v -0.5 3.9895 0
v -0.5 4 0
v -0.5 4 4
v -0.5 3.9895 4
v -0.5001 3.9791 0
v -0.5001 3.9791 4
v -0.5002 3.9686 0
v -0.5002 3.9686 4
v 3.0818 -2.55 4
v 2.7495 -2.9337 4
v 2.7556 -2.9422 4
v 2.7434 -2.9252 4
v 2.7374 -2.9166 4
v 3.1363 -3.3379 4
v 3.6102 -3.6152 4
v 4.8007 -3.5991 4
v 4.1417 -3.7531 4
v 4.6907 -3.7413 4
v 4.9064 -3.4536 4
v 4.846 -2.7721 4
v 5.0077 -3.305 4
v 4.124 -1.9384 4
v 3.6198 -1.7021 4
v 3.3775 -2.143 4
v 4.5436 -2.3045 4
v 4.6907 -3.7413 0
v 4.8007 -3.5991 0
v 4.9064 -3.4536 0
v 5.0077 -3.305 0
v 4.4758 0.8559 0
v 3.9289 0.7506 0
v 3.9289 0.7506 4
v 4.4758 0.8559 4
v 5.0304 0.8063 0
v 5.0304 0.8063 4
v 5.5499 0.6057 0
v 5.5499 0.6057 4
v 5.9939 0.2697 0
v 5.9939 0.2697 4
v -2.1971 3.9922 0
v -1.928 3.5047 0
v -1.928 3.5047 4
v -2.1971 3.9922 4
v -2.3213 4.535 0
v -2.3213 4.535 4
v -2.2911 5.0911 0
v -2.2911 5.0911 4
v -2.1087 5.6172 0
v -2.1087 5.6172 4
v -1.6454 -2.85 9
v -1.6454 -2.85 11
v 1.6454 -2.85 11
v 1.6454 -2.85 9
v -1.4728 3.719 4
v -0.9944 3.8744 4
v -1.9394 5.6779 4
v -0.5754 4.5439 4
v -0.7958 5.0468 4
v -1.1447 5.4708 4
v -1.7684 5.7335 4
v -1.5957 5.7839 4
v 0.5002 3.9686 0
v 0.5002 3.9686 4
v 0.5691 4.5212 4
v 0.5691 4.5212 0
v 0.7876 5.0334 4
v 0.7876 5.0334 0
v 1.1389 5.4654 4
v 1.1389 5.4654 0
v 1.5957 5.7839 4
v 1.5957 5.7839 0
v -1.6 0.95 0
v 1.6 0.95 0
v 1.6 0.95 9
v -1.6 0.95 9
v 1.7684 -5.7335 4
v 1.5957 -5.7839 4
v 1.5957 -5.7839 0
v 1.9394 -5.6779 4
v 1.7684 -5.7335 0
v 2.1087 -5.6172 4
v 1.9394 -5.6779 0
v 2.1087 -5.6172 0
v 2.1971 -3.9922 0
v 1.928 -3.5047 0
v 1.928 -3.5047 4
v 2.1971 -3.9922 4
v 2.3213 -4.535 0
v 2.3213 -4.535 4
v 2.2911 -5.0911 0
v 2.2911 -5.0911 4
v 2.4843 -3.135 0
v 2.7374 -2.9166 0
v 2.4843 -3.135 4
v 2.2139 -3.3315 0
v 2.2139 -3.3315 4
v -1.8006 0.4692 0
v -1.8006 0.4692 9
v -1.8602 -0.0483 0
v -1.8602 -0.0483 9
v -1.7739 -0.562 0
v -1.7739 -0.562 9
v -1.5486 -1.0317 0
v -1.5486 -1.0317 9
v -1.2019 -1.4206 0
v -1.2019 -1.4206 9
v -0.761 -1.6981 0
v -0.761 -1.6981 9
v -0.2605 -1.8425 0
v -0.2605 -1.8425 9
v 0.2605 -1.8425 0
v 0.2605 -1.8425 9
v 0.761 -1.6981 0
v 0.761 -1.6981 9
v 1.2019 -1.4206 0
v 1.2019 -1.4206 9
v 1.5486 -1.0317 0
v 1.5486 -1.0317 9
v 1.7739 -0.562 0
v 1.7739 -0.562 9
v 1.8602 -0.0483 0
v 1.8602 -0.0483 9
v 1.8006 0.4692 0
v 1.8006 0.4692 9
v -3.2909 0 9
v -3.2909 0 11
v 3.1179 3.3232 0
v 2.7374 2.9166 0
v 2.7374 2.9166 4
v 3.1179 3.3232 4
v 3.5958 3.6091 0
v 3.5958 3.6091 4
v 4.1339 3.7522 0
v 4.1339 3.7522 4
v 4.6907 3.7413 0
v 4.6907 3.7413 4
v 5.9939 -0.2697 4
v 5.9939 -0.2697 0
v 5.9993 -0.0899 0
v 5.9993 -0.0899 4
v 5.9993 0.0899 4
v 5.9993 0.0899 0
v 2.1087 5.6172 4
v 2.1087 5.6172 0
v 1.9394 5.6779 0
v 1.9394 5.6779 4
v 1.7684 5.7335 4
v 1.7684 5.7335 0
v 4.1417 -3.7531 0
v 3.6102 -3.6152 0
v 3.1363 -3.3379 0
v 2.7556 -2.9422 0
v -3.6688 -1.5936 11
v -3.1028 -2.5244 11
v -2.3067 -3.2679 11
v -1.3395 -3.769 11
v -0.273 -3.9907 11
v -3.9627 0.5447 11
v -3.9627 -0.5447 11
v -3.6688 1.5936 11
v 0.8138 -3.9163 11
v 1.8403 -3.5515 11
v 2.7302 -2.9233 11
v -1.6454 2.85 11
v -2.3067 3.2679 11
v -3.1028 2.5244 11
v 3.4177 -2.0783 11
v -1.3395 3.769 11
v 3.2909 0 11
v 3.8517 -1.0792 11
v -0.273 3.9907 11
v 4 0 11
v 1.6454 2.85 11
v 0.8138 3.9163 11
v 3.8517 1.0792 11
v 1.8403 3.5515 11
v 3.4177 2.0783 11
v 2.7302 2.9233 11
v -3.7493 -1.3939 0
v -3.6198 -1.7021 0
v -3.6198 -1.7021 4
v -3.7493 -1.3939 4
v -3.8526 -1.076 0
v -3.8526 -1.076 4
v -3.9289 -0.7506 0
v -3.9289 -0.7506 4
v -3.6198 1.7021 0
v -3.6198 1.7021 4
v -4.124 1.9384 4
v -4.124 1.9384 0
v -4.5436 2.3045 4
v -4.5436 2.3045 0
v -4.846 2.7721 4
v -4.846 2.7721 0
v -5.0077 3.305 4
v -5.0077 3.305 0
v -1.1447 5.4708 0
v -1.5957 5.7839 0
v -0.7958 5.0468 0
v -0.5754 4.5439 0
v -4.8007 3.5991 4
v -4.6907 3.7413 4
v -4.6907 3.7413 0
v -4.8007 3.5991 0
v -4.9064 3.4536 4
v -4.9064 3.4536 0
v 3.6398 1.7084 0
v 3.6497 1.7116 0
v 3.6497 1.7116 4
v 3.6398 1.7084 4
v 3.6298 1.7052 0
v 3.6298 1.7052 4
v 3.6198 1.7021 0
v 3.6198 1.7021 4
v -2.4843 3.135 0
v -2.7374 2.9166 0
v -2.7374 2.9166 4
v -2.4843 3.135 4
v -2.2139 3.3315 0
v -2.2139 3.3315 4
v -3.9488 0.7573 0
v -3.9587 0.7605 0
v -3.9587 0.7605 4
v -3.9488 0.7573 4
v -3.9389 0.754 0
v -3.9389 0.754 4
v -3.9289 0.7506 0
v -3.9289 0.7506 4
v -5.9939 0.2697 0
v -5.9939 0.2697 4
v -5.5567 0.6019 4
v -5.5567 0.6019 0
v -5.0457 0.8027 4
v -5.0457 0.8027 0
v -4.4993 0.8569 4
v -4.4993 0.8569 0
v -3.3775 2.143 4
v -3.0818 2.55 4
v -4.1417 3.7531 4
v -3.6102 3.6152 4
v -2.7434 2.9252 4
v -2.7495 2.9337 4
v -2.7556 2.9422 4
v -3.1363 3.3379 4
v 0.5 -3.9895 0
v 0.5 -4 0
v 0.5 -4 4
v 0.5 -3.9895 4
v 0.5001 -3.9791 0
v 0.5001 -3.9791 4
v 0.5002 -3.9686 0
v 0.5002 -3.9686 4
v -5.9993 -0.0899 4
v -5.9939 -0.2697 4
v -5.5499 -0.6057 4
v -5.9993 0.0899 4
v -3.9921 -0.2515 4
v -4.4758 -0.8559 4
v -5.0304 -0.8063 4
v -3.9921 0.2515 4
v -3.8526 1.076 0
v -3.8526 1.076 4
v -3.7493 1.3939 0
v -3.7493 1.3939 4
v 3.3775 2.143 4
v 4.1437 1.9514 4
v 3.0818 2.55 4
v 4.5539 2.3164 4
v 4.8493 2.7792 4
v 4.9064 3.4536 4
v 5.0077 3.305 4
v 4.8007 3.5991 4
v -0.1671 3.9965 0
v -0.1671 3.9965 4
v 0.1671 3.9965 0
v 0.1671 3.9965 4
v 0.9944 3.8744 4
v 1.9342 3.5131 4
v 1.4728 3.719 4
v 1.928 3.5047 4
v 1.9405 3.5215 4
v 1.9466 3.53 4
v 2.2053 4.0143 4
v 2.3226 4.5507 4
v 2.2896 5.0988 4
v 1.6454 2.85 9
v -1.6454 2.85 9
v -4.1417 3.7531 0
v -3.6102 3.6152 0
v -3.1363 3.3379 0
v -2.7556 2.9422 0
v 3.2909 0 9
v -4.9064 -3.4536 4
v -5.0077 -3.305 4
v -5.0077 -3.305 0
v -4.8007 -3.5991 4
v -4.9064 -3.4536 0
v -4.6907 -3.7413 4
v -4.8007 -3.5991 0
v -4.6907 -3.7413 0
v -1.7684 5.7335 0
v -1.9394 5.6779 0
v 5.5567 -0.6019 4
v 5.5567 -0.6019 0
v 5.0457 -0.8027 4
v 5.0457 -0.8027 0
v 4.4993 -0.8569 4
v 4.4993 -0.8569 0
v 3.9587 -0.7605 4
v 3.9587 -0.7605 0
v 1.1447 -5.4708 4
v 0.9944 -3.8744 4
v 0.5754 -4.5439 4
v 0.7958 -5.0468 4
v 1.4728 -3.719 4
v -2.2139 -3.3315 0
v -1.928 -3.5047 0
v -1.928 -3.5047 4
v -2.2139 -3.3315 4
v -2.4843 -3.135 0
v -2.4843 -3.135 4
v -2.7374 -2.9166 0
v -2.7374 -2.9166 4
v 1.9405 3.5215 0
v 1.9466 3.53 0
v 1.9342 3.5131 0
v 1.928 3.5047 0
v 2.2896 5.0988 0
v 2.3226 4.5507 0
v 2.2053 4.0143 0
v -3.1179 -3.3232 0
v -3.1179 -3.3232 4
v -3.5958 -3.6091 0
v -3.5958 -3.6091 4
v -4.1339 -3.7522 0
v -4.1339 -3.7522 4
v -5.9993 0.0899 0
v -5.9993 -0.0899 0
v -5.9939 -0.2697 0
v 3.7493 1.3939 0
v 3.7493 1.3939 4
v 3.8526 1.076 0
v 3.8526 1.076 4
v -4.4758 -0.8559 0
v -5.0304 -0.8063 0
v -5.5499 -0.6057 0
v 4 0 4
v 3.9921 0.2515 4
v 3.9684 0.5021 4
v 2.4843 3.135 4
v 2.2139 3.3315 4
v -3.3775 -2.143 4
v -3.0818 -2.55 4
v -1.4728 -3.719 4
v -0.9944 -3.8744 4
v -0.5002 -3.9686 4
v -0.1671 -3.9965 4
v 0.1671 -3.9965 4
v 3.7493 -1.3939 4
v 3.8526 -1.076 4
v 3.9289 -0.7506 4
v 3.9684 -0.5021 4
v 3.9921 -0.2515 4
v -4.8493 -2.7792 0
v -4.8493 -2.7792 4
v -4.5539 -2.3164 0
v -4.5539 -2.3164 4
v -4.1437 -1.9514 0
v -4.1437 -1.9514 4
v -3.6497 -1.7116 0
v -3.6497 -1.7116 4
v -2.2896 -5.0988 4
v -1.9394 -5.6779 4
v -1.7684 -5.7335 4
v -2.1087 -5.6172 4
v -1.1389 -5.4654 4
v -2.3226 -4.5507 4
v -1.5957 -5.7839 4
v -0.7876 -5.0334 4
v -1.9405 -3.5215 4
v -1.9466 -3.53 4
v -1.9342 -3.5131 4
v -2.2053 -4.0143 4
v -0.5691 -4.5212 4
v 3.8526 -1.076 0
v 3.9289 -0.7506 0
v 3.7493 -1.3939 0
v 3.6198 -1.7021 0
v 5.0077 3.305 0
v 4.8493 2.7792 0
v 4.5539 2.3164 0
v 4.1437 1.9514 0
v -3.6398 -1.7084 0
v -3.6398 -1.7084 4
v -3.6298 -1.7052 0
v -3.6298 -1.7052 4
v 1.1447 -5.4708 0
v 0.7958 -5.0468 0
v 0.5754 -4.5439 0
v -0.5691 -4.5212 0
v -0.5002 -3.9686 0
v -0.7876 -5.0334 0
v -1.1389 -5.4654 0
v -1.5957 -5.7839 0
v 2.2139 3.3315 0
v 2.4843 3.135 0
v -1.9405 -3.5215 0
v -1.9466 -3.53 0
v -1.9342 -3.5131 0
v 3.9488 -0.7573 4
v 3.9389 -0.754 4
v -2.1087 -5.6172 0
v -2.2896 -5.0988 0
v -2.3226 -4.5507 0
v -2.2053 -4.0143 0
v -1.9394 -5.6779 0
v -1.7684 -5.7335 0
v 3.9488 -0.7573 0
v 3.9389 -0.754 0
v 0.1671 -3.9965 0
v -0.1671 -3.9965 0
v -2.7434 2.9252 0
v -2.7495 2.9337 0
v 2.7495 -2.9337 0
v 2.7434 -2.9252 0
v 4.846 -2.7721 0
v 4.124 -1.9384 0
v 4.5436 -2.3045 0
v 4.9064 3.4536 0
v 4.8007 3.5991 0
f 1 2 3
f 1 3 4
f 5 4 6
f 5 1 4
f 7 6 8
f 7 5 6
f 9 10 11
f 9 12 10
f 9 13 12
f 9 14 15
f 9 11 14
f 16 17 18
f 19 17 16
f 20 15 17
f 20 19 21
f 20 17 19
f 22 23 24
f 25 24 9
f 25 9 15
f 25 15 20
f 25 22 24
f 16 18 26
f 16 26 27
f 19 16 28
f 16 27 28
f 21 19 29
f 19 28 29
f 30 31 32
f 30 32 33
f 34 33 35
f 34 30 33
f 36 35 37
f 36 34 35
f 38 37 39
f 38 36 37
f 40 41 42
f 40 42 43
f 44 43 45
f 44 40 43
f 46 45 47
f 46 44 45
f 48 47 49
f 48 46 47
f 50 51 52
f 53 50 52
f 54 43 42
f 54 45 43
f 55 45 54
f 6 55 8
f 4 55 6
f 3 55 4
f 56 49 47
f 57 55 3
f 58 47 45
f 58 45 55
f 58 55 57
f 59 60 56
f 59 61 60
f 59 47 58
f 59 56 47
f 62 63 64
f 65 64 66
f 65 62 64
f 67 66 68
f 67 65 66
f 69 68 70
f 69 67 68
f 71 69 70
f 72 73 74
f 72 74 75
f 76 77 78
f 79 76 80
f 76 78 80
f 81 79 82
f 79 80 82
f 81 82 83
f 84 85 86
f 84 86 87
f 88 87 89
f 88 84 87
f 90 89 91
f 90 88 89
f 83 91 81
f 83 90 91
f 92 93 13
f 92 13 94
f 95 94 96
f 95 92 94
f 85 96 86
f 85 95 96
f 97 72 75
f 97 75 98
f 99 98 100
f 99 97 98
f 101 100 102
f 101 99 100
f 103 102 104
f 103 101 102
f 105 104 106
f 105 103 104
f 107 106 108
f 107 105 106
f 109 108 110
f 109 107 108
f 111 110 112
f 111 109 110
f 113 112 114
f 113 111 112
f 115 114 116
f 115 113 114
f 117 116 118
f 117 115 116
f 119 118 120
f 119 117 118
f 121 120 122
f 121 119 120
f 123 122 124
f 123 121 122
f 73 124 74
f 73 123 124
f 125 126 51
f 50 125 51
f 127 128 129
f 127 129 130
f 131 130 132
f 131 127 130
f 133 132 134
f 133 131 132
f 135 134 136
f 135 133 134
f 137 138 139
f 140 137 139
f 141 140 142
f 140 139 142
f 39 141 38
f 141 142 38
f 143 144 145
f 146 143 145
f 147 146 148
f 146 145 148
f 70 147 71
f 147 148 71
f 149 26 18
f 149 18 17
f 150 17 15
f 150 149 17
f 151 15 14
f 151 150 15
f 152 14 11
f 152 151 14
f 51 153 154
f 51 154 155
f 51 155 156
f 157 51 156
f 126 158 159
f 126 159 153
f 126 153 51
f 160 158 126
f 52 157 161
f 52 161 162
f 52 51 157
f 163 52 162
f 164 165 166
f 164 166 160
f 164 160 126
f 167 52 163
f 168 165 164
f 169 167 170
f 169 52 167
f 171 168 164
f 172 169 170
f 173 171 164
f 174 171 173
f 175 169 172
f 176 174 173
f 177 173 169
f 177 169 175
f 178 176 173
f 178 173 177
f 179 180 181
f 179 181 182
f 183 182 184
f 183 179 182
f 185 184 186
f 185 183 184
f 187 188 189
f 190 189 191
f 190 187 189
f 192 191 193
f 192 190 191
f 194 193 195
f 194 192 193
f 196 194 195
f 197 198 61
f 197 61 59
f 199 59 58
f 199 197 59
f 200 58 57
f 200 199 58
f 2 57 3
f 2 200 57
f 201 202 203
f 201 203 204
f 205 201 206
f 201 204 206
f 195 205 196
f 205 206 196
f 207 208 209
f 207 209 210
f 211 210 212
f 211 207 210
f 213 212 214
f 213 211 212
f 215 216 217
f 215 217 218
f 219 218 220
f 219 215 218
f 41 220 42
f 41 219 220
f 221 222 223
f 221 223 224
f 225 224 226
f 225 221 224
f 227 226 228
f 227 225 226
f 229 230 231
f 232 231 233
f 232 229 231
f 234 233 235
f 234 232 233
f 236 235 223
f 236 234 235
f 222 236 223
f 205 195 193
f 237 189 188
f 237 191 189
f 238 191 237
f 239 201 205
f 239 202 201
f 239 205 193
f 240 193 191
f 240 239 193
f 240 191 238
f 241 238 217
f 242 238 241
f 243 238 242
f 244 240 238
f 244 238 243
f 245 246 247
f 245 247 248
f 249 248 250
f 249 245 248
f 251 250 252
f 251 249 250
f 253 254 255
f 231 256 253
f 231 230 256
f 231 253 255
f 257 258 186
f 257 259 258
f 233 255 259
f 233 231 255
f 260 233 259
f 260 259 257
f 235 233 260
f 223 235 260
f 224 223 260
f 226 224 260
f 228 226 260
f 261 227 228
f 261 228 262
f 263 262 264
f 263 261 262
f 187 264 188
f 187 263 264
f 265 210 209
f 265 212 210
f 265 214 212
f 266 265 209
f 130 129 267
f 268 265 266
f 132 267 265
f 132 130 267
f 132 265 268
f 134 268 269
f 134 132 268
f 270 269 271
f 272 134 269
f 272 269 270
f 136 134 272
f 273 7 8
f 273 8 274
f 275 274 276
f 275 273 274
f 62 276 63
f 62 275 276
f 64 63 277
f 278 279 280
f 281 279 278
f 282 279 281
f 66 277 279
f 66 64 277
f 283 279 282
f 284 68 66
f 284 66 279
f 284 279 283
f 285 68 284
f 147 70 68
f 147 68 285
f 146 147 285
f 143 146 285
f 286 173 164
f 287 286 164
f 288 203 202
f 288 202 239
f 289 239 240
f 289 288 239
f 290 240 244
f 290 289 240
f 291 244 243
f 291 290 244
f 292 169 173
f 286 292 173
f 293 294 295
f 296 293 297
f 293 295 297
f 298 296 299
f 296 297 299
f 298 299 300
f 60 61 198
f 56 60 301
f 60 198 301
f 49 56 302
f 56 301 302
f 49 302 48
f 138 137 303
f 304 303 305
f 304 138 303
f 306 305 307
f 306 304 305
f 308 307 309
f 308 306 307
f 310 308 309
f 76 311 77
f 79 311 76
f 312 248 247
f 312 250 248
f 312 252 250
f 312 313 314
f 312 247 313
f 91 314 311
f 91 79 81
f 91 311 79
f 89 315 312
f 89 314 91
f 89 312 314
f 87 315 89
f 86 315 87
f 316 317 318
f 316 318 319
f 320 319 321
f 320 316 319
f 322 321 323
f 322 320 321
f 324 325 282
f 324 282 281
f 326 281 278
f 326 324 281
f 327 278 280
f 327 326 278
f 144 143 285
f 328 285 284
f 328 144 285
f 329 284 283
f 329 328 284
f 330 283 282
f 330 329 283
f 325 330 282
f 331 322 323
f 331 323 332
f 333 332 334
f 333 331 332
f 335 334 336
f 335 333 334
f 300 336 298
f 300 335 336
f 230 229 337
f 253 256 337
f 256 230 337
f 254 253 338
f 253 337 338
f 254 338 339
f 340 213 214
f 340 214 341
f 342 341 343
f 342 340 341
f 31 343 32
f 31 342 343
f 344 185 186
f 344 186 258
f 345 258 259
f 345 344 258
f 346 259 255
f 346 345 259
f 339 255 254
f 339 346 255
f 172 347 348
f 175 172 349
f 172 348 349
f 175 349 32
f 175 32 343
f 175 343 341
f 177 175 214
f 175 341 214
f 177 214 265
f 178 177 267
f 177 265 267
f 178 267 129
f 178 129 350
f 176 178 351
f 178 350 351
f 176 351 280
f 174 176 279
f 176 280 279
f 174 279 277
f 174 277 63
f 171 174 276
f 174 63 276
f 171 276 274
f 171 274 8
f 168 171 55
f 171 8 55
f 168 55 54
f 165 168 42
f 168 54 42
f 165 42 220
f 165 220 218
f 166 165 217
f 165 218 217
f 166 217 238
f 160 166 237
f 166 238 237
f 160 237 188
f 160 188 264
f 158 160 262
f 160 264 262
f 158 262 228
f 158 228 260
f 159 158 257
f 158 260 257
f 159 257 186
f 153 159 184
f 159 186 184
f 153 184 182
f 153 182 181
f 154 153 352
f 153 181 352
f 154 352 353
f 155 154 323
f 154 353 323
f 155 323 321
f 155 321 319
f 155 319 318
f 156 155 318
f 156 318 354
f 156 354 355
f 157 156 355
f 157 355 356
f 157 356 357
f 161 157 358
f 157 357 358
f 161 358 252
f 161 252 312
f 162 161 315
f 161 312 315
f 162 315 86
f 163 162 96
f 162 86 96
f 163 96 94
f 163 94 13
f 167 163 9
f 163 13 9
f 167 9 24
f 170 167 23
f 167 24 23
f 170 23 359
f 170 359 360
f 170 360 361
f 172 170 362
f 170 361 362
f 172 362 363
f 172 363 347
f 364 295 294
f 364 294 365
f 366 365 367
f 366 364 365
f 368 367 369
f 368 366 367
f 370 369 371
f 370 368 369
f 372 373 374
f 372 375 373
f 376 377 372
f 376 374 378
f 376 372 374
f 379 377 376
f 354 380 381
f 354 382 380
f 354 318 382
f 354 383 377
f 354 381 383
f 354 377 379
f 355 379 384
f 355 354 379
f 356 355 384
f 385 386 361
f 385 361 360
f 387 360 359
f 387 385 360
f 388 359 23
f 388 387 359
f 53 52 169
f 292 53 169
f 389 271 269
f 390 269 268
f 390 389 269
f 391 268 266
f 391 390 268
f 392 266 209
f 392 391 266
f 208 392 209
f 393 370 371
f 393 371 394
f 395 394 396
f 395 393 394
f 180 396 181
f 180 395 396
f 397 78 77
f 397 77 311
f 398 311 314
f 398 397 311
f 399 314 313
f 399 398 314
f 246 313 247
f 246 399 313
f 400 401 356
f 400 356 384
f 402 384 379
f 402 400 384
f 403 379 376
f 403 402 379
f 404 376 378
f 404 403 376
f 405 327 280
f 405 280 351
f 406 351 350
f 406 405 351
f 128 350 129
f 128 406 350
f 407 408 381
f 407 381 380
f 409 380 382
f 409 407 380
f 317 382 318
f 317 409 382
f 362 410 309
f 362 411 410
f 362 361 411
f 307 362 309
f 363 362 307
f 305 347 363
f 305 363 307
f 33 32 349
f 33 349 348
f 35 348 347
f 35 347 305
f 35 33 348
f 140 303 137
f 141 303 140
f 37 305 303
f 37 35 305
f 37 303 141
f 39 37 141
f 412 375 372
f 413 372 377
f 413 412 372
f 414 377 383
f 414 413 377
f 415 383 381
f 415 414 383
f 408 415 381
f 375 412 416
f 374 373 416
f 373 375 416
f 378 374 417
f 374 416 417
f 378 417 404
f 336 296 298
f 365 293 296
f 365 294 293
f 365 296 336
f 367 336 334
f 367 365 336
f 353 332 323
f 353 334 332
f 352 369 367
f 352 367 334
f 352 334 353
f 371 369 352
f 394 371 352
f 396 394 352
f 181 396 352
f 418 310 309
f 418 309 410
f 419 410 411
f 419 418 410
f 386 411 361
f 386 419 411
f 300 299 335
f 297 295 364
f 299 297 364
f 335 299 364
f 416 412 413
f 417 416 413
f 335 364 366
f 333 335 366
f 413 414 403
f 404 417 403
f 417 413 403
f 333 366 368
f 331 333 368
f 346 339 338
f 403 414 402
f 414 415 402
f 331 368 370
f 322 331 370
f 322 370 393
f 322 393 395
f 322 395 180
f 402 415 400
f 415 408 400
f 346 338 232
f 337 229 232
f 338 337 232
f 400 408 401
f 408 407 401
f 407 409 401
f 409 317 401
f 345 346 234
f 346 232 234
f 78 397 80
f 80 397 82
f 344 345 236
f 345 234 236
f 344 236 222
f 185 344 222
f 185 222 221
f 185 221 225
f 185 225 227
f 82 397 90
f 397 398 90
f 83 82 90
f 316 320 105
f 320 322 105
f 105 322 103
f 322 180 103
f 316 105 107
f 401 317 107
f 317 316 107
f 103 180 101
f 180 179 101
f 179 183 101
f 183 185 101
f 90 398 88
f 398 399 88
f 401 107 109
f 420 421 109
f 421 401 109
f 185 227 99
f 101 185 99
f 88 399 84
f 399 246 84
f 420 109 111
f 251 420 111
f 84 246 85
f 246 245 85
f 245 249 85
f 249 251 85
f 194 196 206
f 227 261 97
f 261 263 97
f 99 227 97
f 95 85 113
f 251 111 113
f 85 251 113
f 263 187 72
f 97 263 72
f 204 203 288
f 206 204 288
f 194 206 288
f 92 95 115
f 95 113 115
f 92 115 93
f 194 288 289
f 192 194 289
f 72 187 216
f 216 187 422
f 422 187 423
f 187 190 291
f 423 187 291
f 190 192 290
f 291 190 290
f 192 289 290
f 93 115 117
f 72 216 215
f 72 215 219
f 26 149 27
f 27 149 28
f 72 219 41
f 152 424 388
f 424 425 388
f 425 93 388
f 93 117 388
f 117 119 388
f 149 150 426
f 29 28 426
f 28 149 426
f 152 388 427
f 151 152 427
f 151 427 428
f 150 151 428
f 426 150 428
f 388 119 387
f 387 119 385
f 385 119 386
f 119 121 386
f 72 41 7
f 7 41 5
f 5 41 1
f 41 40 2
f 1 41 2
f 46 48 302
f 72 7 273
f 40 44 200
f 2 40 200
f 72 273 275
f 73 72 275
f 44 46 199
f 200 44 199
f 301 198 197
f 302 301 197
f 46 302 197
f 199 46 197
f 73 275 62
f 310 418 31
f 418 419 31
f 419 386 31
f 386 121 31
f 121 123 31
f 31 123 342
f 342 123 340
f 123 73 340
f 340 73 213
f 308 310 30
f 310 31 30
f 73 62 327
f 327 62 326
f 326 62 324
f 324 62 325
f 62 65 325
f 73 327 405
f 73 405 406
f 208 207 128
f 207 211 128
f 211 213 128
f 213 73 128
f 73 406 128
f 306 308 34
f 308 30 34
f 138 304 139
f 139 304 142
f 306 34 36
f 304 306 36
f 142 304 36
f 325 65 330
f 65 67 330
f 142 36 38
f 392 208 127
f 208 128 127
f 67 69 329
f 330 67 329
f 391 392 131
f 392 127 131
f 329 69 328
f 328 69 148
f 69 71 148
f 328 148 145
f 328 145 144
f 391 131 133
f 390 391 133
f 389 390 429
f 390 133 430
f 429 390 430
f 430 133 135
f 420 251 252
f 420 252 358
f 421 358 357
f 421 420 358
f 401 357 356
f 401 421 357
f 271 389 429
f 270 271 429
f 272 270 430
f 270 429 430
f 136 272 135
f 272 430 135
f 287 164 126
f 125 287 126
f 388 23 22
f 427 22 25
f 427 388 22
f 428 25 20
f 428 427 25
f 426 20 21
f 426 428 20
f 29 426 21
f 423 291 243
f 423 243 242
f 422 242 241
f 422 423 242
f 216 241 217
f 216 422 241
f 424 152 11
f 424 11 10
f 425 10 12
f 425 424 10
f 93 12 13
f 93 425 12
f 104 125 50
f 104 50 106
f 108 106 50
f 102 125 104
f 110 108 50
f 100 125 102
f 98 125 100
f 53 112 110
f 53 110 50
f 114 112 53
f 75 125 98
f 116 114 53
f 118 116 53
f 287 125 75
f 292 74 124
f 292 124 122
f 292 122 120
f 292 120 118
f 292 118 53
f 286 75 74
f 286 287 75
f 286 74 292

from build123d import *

# Parameters (mm, degrees)
SKETCH1_R           = 6
SKETCH1_R_2         = 2
BOSS_EXTRUDE1_DEPTH = 4
CUT_EXTRUDE2_DEPTH  = 10.38083152
CIRPATTERN2_COUNT   = 10
SKETCH11_R          = 4
BOSS_EXTRUDE2_DEPTH = 11
CUT_EXTRUDE3_START  = 11
CUT_EXTRUDE3_DEPTH  = 2
CUT_EXTRUDE4_DEPTH  = 14.800492389


with BuildPart() as part:
    # Sketch1 → Boss-Extrude1 (new body)
    with BuildSketch(Plane.XY):
        Circle(SKETCH1_R)
        Circle(SKETCH1_R_2, mode=Mode.SUBTRACT)
    extrude(amount=BOSS_EXTRUDE1_DEPTH)

    # Sketch4 → Cut-Extrude2 (cut, through all)
    with BuildSketch(Plane.XY):
        with BuildLine():
            ThreePointArc((-0.50024657, 3.968595894), (0, 4), (0.50024657, 3.968595894))
            ThreePointArc((0.50024657, 3.968595894), (1.074726656, 5.403066604), (2.5, 6))
            ThreePointArc((2.5, 6), (0, 6.5), (-2.5, 6))
            ThreePointArc((-2.5, 6), (-1.085786438, 5.414213562), (-0.5, 4))
            ThreePointArc((-0.5, 4), (-0.500061643, 3.984297463), (-0.50024657, 3.968595894))
        make_face()
    cut_extrude2 = extrude(amount=CUT_EXTRUDE2_DEPTH, mode=Mode.SUBTRACT)

    # CirPattern2: Cut-Extrude2 ×10 about axis
    cirpattern2_axis = Axis((0, 0, 4), (0, 0, -1))
    for i in range(1, CIRPATTERN2_COUNT):
        add(cut_extrude2.rotate(cirpattern2_axis, i * 360 / CIRPATTERN2_COUNT), mode=Mode.SUBTRACT)

    # Sketch11 → Boss-Extrude2 (add)
    with BuildSketch(Plane.XY):
        Circle(SKETCH11_R)
    extrude(amount=BOSS_EXTRUDE2_DEPTH)

    # Sketch12 → Cut-Extrude3 (cut)
    with BuildSketch(Plane.XY.offset(CUT_EXTRUDE3_START)):
        Polygon((3.290896534, 0), (1.645448267, 2.85), (-1.645448267, 2.85), (-3.290896534, 0), (-1.645448267, -2.85), (1.645448267, -2.85), align=None)
    extrude(amount=-CUT_EXTRUDE3_DEPTH, mode=Mode.SUBTRACT)

    # Sketch13 → Cut-Extrude4 (cut, through all)
    with BuildSketch(Plane.XY):
        with BuildLine():
            ThreePointArc((-1.6, 0.95), (0, -1.860779407), (1.6, 0.95))
            Line((1.6, 0.95), (-1.6, 0.95))
        make_face()
    extrude(amount=CUT_EXTRUDE4_DEPTH, mode=Mode.SUBTRACT)


solid = part.part
